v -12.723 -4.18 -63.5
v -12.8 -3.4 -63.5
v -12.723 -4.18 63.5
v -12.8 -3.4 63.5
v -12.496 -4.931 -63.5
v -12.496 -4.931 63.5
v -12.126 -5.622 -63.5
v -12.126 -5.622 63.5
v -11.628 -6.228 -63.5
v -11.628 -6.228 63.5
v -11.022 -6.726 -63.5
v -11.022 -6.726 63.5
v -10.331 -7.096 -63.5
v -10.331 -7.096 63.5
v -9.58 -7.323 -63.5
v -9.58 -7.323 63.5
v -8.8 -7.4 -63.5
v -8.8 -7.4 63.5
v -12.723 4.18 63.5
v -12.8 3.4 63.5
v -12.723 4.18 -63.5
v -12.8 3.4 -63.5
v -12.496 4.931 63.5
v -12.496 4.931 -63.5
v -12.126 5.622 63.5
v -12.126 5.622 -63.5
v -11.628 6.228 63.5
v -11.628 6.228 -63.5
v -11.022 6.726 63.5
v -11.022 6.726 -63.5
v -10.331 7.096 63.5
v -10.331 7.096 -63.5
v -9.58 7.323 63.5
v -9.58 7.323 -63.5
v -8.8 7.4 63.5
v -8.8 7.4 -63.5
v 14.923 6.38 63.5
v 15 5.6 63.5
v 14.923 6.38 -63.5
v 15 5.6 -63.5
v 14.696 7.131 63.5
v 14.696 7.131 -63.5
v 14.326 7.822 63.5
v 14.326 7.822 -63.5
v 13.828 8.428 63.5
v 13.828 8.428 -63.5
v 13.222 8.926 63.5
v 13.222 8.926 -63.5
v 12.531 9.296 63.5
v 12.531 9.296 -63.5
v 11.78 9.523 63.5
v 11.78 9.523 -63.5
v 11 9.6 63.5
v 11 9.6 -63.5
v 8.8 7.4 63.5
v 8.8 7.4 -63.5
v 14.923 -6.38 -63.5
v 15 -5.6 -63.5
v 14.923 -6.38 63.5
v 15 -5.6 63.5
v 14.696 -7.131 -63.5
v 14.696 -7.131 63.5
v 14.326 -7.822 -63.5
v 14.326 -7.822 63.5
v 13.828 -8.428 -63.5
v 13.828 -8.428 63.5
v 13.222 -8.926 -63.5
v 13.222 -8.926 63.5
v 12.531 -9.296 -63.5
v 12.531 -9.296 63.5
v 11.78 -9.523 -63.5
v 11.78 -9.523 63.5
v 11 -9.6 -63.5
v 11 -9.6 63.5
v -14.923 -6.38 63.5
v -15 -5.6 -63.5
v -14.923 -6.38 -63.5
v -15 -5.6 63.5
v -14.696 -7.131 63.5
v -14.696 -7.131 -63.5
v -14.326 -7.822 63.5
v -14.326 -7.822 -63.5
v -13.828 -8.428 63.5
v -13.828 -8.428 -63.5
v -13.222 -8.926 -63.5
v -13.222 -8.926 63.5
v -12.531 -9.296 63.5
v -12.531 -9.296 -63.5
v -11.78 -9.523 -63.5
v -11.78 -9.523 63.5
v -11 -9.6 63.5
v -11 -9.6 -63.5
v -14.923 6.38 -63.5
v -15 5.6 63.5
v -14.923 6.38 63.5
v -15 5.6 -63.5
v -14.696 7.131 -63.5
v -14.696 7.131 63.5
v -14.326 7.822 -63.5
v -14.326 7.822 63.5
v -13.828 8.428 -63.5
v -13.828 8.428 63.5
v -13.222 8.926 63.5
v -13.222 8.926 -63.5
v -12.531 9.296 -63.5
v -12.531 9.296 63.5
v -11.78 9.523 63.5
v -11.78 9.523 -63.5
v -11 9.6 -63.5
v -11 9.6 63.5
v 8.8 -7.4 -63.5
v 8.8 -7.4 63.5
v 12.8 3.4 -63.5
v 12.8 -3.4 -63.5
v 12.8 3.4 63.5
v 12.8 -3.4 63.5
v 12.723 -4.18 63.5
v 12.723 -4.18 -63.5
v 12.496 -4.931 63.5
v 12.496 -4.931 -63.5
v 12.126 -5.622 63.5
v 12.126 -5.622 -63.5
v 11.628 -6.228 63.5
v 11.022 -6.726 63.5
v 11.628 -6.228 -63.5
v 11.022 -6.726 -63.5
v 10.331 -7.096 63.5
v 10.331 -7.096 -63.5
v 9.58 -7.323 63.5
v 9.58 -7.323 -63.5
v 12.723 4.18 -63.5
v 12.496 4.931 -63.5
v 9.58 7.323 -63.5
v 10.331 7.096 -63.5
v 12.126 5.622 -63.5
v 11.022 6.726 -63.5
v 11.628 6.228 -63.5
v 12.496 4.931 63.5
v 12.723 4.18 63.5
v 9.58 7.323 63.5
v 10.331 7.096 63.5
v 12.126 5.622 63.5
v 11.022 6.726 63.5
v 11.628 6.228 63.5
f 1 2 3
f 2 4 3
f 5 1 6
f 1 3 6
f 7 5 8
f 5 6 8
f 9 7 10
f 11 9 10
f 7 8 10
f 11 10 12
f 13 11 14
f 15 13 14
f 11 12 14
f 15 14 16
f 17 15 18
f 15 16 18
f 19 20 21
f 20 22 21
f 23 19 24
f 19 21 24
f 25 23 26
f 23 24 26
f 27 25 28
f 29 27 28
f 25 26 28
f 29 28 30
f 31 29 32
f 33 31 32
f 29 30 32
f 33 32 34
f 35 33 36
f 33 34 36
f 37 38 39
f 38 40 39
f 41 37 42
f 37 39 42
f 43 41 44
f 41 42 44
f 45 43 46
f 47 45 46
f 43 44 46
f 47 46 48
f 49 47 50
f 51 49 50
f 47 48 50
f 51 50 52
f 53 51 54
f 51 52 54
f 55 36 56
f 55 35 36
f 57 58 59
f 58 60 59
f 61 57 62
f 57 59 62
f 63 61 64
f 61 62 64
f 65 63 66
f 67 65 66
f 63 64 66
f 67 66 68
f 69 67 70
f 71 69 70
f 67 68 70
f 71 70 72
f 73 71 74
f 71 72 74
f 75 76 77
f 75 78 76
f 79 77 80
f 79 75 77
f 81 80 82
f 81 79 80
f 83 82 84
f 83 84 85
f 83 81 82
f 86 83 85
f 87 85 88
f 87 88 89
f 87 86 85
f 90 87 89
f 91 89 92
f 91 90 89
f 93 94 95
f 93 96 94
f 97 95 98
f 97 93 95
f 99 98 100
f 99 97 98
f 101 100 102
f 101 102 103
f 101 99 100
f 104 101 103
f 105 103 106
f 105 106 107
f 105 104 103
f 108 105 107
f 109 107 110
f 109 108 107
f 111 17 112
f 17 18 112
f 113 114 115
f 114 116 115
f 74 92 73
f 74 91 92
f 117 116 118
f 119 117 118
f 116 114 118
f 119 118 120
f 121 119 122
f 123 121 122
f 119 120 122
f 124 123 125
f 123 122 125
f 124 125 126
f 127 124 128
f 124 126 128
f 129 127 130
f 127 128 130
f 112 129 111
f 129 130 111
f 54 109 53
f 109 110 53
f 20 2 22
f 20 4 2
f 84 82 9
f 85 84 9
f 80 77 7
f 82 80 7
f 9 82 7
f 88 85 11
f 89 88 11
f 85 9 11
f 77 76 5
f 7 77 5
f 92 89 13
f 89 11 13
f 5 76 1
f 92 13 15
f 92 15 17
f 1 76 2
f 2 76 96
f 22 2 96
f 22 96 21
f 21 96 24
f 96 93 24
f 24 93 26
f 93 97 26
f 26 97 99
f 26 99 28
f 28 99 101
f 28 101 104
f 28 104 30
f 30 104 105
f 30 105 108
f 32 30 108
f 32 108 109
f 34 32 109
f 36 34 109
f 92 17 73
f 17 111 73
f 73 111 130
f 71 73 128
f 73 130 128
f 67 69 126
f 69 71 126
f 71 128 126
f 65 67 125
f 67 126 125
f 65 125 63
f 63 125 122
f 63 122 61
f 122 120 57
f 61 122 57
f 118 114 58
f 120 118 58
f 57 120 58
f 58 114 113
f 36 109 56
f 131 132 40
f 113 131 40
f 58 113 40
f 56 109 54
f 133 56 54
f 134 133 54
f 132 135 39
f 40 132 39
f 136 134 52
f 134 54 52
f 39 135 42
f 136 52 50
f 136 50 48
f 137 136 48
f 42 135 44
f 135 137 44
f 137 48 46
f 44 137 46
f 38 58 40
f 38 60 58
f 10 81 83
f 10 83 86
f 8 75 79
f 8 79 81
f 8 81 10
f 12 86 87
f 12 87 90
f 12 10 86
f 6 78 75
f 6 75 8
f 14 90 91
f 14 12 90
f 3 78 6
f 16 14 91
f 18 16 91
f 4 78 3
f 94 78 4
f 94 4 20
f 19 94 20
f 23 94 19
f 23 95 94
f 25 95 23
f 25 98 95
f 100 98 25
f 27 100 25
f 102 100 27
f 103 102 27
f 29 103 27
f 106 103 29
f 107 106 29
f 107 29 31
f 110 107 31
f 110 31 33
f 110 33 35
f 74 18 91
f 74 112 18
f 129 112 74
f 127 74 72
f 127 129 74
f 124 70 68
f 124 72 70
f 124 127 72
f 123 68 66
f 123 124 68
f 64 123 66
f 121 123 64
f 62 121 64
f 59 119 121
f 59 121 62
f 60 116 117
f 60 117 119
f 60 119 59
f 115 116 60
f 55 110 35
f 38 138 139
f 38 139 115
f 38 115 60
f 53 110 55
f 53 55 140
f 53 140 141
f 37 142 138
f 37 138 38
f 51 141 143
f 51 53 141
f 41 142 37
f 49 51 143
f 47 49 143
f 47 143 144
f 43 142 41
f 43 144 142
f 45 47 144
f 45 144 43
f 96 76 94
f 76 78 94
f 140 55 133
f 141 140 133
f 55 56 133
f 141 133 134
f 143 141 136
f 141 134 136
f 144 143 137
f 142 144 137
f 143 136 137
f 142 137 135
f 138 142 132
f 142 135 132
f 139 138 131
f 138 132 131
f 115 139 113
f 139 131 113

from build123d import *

# Parameters (mm, degrees)
ESQUISSE1_W             = 30
ESQUISSE1_H             = 19.2
ESQUISSE1_W_2           = 25.6
ESQUISSE1_H_2           = 14.8
BOSS_EXTRU_1_DEPTH      = 63.5
BOSS_EXTRU_1_DEPTH_BACK = 63.5
CONG_3_R                = 4


with BuildPart() as part:
    # Esquisse1 → Boss.-Extru.1 (new body, two sides)
    with BuildSketch(Plane.XY) as boss_extru_1_sk:
        Rectangle(ESQUISSE1_W, ESQUISSE1_H)
        Rectangle(ESQUISSE1_W_2, ESQUISSE1_H_2, mode=Mode.SUBTRACT)
    extrude(amount=BOSS_EXTRU_1_DEPTH)
    extrude(boss_extru_1_sk.sketch, amount=-BOSS_EXTRU_1_DEPTH_BACK)

    # Cong_3
    cong_3_edges = [part.edges().sort_by_distance(p)[0] for p in [
        (12.8, 7.4, 0),
        (12.8, -7.4, 0),
        (-12.8, -7.4, 0),
        (-12.8, 7.4, 0),
        (15, -9.6, 0),
        (-15, -9.6, 0),
        (-15, 9.6, 0),
        (15, 9.6, 0),
    ]]
    fillet(cong_3_edges, radius=CONG_3_R)


solid = part.part
